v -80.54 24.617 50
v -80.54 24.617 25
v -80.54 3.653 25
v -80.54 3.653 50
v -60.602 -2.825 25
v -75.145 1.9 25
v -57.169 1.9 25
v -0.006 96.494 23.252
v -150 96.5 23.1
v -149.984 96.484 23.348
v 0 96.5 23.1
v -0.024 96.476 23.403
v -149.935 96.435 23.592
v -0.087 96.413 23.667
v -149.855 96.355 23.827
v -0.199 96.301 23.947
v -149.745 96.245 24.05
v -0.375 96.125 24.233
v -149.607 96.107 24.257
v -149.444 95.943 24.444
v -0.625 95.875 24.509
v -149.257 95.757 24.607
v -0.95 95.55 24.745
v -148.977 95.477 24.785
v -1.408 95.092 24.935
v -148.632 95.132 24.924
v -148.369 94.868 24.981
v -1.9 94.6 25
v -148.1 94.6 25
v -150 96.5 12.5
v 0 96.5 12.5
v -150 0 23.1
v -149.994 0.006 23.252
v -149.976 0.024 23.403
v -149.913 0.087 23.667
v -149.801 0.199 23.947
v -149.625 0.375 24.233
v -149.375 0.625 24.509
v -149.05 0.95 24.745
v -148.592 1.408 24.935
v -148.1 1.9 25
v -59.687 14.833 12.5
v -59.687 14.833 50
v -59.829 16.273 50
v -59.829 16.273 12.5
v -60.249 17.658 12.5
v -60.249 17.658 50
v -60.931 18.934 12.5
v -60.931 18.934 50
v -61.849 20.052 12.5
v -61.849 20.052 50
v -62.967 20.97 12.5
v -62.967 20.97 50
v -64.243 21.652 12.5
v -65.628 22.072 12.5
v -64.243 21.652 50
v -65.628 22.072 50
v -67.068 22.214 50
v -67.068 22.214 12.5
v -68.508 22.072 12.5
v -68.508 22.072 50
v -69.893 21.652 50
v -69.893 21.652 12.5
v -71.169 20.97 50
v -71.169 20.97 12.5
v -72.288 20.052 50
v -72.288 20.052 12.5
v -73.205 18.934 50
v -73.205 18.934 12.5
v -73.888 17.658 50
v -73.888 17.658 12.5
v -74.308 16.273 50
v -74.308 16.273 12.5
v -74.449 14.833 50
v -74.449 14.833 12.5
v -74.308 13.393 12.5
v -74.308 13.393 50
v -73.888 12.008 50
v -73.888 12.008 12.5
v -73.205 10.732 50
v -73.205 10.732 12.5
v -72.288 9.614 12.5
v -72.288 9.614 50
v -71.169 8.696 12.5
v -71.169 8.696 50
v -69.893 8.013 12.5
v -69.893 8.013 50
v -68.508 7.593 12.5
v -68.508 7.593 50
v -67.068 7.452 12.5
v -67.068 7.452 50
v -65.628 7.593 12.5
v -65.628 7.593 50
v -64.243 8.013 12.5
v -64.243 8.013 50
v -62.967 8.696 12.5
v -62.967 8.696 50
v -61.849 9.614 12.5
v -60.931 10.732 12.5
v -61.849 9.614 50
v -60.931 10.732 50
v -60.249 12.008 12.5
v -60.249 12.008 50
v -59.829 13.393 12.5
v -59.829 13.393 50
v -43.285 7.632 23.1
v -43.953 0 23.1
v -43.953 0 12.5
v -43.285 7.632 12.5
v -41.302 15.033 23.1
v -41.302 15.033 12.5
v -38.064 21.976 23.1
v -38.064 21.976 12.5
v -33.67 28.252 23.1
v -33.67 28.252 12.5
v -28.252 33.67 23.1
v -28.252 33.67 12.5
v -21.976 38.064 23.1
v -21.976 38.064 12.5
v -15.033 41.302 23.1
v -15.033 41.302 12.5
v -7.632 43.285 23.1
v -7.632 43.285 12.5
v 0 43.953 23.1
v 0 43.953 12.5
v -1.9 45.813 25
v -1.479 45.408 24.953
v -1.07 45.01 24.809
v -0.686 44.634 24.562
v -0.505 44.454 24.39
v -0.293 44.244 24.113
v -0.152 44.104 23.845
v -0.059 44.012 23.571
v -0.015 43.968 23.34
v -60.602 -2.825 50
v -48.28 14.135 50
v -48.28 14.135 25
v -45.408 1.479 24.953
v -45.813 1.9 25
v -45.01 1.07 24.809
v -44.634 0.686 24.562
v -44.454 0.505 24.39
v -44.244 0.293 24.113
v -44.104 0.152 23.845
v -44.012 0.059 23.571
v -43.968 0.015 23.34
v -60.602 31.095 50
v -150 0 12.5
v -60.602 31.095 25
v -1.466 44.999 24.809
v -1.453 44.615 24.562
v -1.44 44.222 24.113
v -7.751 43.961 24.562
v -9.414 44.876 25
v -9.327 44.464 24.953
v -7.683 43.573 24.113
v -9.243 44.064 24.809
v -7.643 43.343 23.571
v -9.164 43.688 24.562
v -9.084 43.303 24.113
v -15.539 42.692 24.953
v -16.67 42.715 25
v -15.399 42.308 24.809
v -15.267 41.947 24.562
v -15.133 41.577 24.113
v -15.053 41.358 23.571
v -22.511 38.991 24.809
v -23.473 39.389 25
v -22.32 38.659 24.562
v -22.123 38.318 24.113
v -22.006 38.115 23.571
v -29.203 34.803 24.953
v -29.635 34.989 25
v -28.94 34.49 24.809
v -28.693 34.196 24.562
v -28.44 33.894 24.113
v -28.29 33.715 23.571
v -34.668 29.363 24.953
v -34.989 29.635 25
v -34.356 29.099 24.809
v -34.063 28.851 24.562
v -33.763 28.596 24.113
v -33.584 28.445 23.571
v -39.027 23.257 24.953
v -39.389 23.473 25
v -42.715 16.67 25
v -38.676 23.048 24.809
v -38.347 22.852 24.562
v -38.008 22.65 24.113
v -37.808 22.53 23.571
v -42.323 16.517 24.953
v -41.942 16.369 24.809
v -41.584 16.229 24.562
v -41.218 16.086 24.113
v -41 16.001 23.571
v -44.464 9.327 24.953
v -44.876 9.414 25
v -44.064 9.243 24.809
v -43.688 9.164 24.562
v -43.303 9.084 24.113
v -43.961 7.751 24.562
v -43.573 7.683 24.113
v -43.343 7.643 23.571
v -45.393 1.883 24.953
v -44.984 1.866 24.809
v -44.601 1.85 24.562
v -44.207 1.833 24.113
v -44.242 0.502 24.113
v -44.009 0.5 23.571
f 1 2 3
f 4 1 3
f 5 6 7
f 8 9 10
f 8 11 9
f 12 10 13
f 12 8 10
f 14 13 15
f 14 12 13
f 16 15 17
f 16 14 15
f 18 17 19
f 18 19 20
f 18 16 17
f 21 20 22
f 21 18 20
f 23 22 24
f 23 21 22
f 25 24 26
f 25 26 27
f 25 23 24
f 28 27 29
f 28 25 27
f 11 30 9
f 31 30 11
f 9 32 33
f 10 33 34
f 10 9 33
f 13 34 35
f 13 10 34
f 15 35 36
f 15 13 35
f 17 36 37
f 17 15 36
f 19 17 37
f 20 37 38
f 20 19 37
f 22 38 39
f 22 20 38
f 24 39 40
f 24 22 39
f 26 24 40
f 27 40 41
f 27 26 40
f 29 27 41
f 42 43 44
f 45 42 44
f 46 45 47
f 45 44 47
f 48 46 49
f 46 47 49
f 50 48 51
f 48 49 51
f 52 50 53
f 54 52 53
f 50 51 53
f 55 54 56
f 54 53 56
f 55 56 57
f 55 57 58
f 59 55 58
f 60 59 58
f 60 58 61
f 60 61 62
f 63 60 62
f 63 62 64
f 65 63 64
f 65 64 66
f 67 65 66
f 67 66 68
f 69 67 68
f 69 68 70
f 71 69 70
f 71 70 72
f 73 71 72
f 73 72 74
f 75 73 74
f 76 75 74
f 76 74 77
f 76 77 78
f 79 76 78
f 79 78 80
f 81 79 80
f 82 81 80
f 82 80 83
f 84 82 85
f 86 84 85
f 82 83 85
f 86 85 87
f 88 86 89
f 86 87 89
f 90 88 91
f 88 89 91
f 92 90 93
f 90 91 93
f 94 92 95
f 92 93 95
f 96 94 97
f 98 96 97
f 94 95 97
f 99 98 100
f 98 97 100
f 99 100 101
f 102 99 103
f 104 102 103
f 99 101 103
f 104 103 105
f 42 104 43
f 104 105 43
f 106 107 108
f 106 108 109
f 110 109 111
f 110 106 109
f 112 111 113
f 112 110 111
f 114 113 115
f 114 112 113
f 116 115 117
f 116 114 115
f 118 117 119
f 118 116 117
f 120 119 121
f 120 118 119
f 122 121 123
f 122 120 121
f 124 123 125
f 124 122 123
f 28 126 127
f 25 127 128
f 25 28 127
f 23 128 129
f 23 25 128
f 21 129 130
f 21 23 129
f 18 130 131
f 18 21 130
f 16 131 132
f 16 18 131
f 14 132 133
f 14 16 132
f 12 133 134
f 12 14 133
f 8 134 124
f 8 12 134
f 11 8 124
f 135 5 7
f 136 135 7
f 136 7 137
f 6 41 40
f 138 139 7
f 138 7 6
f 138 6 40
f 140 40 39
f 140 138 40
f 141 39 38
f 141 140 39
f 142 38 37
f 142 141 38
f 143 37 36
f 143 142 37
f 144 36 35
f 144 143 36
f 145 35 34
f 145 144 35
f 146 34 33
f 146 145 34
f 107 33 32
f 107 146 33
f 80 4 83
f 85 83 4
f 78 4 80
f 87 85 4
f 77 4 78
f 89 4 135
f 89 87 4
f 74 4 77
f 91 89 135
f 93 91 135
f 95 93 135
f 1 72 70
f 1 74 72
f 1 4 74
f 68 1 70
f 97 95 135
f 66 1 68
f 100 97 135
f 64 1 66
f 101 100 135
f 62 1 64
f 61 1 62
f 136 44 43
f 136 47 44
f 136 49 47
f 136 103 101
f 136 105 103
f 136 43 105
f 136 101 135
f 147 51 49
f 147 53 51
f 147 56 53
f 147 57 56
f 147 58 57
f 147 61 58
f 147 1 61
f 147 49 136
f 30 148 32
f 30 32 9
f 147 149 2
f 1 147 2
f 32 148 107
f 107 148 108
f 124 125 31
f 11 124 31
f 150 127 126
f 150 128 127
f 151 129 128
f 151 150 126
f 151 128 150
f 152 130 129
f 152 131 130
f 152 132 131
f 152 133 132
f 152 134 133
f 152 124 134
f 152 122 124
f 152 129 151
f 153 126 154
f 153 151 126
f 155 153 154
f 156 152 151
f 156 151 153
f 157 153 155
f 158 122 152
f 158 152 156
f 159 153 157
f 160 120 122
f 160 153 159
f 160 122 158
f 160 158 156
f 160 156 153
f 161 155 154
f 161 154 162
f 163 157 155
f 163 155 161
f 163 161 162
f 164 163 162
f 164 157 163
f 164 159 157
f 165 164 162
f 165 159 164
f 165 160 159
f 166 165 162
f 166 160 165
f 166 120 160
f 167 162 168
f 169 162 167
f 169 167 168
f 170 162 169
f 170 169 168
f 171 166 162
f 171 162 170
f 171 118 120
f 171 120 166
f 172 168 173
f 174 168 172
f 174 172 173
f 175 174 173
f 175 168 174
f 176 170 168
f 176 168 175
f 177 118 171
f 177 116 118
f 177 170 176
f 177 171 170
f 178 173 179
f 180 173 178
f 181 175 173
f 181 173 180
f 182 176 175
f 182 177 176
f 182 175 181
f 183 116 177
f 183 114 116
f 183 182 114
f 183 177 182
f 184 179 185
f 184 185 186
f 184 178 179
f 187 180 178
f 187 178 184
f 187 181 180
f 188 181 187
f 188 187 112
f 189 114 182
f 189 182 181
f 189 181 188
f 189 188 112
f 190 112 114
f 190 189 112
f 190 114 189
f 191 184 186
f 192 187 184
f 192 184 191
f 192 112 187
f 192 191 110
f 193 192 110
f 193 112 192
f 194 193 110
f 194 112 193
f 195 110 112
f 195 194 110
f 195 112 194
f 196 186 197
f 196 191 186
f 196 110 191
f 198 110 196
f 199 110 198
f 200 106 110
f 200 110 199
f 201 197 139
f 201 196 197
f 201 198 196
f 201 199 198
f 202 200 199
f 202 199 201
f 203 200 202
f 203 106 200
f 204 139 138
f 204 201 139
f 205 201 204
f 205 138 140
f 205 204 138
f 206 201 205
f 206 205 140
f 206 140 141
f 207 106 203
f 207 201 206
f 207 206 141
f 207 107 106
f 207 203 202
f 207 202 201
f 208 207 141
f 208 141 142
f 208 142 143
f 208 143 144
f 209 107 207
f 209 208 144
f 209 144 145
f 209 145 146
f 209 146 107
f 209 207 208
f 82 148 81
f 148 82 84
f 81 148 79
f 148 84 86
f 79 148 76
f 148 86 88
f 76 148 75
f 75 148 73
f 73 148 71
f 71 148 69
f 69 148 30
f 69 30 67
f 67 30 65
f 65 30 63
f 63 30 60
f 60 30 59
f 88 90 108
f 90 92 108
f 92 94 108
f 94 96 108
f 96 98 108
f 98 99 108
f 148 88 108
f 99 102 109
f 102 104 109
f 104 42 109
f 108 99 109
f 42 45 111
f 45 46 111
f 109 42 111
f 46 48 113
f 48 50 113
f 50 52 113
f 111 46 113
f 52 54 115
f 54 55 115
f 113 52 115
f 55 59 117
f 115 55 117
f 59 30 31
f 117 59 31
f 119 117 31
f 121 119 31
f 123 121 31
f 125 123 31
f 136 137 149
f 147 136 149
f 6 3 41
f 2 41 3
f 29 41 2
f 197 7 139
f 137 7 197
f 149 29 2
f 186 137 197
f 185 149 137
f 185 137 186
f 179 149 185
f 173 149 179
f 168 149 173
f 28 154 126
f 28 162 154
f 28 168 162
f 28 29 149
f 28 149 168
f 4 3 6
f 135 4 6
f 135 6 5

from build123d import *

# Parameters (mm, degrees)
F0_W     = 150
F0_H     = 96.499916
F1_DEPTH = 25
F3_DEPTH = 12.5
F4_R     = 1.9
F6_DEPTH = 25
F7_R     = 7.381343
F8_DEPTH = 50


with BuildPart() as f1:
    # F0 (on Top) → F1 (new body)
    with BuildSketch(Plane.XY):
        with Locations((-75, 48.249958)):
            Rectangle(F0_W, F0_H)
    extrude(amount=F1_DEPTH)

    # F2 (on face) → F3 (intersect, symmetric)
    with BuildSketch(Plane.XY.offset(25)):
        with BuildLine():
            ThreePointArc((-43.952633, 0), (-31.079205, 31.079205), (0, 43.952633))
            Line((0, 43.952633), (0, 96.499916))
            Line((0, 96.499916), (-150, 96.499916))
            Line((-150, 96.499916), (-150, 0))
            Line((-150, 0), (-43.952633, 0))
        make_face()
    extrude(amount=F3_DEPTH, both=True, mode=Mode.INTERSECT)

    # F4
    f4_edges = [f1.edges().sort_by_distance(p)[0] for p in [
        (0, 70.226275, 25),
        (-31.079205, 31.079205, 25),
        (-96.976317, 0, 25),
        (-150, 48.249958, 25),
        (-75, 96.499916, 25),
    ]]
    fillet(f4_edges, radius=F4_R)

    # F5 (on face) → F6 (join)
    with BuildSketch(Plane.XY.offset(25)):
        Polygon((-80.540083, 24.616941), (-80.540083, 3.653123), (-60.602307, -2.825054), (-48.280083, 14.135032), (-60.602307, 31.095118), align=None)
    extrude(amount=F6_DEPTH)

    # F7 (on face) → F8 (cut)
    with BuildSketch(Plane.XY.offset(50)):
        with Locations((-67.068137, 14.832954)):
            Circle(F7_R)
    extrude(amount=-F8_DEPTH, mode=Mode.SUBTRACT)


solid = f1.part
